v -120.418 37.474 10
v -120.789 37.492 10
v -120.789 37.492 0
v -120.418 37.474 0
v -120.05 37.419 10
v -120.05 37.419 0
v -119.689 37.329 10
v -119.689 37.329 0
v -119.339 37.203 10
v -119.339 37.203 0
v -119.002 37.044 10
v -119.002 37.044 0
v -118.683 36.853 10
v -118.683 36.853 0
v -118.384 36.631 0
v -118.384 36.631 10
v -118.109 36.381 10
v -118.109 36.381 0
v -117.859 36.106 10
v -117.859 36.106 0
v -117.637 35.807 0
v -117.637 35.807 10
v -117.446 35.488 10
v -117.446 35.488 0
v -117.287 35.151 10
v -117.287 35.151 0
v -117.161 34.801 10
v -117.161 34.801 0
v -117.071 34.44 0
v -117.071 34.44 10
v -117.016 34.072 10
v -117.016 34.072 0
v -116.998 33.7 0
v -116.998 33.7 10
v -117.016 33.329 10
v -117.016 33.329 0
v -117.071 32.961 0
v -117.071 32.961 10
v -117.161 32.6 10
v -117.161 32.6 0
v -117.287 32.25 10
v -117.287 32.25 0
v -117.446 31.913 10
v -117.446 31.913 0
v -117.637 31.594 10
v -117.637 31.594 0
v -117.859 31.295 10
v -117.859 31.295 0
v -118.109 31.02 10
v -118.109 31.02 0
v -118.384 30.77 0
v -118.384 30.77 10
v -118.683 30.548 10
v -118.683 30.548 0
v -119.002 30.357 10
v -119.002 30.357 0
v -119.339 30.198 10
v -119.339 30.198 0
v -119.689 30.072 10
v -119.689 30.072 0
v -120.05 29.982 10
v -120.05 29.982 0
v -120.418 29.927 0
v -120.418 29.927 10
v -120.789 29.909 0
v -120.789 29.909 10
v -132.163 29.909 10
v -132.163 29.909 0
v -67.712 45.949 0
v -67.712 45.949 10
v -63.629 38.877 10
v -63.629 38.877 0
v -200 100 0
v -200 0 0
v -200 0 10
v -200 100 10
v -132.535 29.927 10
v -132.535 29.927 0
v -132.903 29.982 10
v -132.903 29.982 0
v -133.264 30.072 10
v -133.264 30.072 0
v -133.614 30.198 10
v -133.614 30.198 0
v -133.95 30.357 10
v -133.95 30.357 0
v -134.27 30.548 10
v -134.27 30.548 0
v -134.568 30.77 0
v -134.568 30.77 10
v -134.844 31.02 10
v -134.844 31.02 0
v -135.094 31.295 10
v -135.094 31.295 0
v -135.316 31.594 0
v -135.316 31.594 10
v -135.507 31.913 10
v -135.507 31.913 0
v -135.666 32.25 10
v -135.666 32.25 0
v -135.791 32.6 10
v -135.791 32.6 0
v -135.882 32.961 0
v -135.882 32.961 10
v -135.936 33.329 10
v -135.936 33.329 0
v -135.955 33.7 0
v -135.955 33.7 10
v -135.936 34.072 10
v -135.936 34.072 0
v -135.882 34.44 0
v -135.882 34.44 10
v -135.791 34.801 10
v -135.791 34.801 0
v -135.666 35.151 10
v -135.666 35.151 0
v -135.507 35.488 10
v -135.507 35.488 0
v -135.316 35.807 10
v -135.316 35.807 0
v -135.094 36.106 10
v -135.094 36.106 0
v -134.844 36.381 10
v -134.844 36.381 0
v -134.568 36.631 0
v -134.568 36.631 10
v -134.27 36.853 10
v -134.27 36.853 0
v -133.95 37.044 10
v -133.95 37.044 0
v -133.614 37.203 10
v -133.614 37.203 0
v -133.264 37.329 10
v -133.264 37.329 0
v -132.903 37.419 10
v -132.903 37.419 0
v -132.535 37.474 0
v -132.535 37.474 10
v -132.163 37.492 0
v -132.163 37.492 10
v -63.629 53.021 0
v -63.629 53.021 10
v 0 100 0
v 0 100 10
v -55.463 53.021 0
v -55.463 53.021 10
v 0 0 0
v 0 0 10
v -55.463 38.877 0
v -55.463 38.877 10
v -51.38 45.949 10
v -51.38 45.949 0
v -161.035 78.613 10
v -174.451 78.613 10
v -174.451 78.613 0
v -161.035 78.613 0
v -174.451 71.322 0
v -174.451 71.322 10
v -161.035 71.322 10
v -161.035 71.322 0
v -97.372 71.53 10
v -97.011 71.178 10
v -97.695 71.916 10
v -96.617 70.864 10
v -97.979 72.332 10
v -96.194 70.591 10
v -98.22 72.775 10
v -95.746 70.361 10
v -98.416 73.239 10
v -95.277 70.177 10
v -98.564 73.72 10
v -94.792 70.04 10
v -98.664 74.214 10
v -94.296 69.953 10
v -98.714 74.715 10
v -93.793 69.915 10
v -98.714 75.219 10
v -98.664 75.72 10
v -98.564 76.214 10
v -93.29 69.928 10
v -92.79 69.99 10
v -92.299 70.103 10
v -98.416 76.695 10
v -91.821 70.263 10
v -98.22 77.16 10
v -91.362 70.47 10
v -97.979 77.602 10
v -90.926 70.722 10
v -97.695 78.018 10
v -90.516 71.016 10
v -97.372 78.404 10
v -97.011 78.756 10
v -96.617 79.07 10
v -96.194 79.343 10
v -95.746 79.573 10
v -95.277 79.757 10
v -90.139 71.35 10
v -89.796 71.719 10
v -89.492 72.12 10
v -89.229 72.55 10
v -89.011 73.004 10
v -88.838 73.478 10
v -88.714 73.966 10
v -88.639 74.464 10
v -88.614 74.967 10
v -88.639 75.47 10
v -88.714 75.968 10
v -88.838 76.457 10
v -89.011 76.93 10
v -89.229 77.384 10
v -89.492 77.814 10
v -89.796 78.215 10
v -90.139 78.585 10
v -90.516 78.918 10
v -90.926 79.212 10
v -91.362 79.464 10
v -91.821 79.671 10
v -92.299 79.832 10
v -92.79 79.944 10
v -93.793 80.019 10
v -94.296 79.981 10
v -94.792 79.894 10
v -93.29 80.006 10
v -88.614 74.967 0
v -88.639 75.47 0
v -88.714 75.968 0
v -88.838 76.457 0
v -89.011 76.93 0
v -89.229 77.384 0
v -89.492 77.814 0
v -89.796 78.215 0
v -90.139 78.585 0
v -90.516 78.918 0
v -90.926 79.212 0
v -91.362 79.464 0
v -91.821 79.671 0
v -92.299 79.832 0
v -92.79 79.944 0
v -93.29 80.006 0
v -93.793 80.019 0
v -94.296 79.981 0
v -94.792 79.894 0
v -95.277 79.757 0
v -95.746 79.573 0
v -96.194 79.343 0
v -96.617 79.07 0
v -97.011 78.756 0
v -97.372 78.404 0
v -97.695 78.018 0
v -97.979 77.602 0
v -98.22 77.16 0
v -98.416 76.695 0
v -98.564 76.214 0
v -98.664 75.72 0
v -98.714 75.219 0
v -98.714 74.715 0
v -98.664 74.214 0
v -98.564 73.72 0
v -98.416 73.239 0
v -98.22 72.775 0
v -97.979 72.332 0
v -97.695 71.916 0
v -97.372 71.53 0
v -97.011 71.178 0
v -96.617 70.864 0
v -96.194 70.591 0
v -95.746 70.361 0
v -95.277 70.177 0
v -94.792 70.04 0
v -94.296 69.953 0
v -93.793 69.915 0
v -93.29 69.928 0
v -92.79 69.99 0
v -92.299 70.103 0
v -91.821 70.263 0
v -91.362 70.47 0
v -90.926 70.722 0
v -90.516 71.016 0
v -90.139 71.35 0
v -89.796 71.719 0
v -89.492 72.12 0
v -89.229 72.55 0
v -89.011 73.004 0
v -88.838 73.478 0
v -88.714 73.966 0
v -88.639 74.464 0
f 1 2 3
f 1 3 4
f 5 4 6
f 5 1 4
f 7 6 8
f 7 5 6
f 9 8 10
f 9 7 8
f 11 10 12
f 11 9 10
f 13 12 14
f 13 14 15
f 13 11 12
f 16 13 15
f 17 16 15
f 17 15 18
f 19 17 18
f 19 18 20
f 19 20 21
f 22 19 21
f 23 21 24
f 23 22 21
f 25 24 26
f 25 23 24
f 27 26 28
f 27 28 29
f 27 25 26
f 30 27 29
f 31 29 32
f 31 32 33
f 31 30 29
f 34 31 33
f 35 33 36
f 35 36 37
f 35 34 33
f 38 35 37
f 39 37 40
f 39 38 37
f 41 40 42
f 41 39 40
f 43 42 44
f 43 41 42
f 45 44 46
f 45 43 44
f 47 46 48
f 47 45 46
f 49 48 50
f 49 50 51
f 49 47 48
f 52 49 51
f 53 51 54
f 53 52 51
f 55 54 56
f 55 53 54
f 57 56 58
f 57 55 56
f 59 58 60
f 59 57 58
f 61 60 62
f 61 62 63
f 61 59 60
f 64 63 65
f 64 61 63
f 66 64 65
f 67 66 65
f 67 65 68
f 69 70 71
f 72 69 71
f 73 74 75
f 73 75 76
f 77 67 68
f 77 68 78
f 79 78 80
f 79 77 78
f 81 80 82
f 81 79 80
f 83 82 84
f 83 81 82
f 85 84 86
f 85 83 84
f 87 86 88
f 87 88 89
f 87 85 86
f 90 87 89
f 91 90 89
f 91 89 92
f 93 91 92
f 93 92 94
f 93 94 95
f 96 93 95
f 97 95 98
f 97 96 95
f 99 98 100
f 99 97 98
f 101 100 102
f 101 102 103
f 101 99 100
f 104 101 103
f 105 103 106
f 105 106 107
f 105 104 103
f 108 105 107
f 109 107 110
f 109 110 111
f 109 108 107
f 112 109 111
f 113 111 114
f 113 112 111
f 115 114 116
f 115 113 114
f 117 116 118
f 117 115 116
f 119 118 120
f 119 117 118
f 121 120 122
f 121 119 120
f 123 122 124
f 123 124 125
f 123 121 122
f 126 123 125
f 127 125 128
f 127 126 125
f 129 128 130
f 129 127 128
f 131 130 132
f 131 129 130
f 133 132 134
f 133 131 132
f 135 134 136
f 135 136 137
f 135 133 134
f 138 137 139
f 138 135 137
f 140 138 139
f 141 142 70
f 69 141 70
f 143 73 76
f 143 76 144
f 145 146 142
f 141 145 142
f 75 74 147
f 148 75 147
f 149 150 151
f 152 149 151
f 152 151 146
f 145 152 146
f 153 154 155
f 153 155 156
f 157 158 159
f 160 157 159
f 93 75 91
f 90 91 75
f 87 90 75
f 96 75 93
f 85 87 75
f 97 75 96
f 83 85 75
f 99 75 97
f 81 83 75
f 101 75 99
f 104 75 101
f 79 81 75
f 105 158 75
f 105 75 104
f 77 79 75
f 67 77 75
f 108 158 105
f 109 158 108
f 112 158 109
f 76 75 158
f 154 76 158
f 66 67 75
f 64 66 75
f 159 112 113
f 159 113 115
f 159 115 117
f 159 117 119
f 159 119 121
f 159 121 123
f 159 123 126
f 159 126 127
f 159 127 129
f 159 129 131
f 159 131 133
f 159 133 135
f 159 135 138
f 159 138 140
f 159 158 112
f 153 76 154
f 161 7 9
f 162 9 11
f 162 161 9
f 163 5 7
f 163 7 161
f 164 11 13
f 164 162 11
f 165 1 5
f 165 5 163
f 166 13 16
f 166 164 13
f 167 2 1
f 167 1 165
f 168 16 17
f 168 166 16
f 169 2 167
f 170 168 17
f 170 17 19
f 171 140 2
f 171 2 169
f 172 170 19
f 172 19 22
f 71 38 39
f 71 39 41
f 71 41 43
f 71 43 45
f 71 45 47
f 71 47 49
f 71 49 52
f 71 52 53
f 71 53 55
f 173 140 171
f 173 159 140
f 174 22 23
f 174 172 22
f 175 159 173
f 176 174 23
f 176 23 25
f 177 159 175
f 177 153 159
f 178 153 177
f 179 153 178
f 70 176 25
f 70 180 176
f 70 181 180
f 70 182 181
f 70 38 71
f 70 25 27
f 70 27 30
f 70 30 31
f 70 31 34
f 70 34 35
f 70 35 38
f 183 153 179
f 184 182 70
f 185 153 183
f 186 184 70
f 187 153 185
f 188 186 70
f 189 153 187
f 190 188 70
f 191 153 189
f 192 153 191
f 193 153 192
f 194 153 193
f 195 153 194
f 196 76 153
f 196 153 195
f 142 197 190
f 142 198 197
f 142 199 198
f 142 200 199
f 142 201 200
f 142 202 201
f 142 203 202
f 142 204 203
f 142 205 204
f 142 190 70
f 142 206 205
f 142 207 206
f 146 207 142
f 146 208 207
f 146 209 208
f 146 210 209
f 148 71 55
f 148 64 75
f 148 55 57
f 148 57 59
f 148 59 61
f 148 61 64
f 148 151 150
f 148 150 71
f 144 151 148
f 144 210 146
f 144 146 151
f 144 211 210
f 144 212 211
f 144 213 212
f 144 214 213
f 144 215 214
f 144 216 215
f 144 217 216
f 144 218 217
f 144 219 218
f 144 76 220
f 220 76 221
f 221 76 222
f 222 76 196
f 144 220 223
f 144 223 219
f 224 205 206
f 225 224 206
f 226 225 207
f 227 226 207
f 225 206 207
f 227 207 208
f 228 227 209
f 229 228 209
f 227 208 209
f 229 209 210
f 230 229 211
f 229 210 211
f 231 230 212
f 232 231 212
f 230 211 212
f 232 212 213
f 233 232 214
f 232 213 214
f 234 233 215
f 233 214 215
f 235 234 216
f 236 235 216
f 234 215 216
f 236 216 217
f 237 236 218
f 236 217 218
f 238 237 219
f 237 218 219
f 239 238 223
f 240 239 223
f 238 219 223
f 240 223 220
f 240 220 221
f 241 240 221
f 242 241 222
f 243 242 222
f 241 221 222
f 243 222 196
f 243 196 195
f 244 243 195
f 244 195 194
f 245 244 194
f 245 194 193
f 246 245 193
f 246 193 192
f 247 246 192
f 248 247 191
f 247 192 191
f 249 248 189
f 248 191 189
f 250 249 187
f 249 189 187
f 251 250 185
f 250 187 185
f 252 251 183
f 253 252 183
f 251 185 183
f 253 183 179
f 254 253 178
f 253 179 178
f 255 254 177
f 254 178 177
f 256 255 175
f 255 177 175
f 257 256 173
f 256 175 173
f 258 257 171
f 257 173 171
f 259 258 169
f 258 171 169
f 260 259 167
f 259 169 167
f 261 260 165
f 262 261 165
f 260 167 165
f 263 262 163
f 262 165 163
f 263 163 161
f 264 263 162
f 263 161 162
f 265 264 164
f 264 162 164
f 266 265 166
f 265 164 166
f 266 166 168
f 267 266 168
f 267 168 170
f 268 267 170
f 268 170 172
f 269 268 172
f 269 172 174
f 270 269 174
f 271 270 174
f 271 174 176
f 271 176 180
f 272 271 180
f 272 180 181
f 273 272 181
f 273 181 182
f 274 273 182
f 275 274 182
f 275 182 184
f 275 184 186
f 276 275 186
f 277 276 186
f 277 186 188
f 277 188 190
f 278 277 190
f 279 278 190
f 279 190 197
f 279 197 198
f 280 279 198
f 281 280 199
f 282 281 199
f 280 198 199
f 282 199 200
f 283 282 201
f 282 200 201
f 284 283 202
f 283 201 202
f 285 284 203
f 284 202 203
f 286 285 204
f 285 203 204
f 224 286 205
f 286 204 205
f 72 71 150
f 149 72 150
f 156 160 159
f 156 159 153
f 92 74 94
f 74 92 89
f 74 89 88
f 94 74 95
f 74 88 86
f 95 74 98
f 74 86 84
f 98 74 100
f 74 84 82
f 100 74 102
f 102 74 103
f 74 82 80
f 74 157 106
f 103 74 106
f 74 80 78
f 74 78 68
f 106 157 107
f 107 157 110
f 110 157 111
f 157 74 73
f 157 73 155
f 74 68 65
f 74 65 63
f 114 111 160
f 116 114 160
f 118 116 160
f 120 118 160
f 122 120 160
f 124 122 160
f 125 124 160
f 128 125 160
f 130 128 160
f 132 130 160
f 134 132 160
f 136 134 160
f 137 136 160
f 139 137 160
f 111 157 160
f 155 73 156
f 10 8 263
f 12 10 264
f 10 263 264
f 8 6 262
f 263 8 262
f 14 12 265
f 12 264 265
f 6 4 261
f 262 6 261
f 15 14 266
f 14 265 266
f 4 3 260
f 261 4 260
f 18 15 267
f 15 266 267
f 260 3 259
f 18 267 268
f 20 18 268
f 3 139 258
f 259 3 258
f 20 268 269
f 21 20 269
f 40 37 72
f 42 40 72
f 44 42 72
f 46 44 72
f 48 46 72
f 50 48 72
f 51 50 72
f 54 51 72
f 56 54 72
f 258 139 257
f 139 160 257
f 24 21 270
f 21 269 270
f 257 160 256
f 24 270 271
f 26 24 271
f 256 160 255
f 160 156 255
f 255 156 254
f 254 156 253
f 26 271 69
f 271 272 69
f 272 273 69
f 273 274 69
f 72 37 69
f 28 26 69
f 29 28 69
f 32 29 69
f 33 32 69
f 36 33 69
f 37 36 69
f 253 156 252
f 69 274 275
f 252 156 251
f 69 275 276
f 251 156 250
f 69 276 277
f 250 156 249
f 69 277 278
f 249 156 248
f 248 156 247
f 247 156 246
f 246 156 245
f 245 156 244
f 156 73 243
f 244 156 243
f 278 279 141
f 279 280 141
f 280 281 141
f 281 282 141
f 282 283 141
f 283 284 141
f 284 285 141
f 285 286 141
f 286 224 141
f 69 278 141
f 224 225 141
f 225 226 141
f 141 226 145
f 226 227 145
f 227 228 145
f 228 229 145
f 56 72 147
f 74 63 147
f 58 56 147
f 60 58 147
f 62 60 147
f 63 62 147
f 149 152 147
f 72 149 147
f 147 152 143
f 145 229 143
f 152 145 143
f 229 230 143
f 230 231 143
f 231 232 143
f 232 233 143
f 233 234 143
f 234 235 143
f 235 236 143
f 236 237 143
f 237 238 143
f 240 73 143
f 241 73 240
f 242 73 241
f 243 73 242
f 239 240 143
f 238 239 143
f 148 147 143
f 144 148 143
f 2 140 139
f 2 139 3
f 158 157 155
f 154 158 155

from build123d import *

# Parameters (mm, degrees)
SKETCH1_W           = 200
SKETCH1_H           = 100
BOSS_EXTRUDE1_DEPTH = 10
SKETCH2_R           = 5.053404716
SKETCH2_W           = 13.415300493
SKETCH2_H           = 7.29092418
CUT_EXTRUDE1_DEPTH  = 10


with BuildPart() as part:
    # Sketch1 → Boss-Extrude1 (new body)
    with BuildSketch(Plane.XY):
        with Locations((-100, 50)):
            Rectangle(SKETCH1_W, SKETCH1_H)
    extrude(amount=BOSS_EXTRUDE1_DEPTH)

    # Sketch2 → Cut-Extrude1 (cut)
    with BuildSketch(Plane.XY.offset(10)):
        with Locations((-93.667207309, 74.96711448)):
            Circle(SKETCH2_R)
        with Locations((-167.742996984, 74.96711448)):
            Rectangle(SKETCH2_W, SKETCH2_H)
        with BuildLine():
            Line((-132.163286982, 37.491764192), (-120.789445261, 37.491764192))
            ThreePointArc((-120.789445261, 37.491764192), (-116.998164687, 33.700483618), (-120.789445261, 29.909203044))
            Line((-120.789445261, 29.909203044), (-132.163286982, 29.909203044))
            ThreePointArc((-132.163286982, 29.909203044), (-135.954567556, 33.700483618), (-132.163286982, 37.491764192))
        make_face()
        Polygon((-51.379847062, 45.949236241), (-55.462764603, 53.021056866), (-63.628599685, 53.021056866), (-67.711517226, 45.949236241), (-63.628599685, 38.877415617), (-55.462764603, 38.877415617), align=None)
    extrude(amount=-CUT_EXTRUDE1_DEPTH, mode=Mode.SUBTRACT)


solid = part.part
